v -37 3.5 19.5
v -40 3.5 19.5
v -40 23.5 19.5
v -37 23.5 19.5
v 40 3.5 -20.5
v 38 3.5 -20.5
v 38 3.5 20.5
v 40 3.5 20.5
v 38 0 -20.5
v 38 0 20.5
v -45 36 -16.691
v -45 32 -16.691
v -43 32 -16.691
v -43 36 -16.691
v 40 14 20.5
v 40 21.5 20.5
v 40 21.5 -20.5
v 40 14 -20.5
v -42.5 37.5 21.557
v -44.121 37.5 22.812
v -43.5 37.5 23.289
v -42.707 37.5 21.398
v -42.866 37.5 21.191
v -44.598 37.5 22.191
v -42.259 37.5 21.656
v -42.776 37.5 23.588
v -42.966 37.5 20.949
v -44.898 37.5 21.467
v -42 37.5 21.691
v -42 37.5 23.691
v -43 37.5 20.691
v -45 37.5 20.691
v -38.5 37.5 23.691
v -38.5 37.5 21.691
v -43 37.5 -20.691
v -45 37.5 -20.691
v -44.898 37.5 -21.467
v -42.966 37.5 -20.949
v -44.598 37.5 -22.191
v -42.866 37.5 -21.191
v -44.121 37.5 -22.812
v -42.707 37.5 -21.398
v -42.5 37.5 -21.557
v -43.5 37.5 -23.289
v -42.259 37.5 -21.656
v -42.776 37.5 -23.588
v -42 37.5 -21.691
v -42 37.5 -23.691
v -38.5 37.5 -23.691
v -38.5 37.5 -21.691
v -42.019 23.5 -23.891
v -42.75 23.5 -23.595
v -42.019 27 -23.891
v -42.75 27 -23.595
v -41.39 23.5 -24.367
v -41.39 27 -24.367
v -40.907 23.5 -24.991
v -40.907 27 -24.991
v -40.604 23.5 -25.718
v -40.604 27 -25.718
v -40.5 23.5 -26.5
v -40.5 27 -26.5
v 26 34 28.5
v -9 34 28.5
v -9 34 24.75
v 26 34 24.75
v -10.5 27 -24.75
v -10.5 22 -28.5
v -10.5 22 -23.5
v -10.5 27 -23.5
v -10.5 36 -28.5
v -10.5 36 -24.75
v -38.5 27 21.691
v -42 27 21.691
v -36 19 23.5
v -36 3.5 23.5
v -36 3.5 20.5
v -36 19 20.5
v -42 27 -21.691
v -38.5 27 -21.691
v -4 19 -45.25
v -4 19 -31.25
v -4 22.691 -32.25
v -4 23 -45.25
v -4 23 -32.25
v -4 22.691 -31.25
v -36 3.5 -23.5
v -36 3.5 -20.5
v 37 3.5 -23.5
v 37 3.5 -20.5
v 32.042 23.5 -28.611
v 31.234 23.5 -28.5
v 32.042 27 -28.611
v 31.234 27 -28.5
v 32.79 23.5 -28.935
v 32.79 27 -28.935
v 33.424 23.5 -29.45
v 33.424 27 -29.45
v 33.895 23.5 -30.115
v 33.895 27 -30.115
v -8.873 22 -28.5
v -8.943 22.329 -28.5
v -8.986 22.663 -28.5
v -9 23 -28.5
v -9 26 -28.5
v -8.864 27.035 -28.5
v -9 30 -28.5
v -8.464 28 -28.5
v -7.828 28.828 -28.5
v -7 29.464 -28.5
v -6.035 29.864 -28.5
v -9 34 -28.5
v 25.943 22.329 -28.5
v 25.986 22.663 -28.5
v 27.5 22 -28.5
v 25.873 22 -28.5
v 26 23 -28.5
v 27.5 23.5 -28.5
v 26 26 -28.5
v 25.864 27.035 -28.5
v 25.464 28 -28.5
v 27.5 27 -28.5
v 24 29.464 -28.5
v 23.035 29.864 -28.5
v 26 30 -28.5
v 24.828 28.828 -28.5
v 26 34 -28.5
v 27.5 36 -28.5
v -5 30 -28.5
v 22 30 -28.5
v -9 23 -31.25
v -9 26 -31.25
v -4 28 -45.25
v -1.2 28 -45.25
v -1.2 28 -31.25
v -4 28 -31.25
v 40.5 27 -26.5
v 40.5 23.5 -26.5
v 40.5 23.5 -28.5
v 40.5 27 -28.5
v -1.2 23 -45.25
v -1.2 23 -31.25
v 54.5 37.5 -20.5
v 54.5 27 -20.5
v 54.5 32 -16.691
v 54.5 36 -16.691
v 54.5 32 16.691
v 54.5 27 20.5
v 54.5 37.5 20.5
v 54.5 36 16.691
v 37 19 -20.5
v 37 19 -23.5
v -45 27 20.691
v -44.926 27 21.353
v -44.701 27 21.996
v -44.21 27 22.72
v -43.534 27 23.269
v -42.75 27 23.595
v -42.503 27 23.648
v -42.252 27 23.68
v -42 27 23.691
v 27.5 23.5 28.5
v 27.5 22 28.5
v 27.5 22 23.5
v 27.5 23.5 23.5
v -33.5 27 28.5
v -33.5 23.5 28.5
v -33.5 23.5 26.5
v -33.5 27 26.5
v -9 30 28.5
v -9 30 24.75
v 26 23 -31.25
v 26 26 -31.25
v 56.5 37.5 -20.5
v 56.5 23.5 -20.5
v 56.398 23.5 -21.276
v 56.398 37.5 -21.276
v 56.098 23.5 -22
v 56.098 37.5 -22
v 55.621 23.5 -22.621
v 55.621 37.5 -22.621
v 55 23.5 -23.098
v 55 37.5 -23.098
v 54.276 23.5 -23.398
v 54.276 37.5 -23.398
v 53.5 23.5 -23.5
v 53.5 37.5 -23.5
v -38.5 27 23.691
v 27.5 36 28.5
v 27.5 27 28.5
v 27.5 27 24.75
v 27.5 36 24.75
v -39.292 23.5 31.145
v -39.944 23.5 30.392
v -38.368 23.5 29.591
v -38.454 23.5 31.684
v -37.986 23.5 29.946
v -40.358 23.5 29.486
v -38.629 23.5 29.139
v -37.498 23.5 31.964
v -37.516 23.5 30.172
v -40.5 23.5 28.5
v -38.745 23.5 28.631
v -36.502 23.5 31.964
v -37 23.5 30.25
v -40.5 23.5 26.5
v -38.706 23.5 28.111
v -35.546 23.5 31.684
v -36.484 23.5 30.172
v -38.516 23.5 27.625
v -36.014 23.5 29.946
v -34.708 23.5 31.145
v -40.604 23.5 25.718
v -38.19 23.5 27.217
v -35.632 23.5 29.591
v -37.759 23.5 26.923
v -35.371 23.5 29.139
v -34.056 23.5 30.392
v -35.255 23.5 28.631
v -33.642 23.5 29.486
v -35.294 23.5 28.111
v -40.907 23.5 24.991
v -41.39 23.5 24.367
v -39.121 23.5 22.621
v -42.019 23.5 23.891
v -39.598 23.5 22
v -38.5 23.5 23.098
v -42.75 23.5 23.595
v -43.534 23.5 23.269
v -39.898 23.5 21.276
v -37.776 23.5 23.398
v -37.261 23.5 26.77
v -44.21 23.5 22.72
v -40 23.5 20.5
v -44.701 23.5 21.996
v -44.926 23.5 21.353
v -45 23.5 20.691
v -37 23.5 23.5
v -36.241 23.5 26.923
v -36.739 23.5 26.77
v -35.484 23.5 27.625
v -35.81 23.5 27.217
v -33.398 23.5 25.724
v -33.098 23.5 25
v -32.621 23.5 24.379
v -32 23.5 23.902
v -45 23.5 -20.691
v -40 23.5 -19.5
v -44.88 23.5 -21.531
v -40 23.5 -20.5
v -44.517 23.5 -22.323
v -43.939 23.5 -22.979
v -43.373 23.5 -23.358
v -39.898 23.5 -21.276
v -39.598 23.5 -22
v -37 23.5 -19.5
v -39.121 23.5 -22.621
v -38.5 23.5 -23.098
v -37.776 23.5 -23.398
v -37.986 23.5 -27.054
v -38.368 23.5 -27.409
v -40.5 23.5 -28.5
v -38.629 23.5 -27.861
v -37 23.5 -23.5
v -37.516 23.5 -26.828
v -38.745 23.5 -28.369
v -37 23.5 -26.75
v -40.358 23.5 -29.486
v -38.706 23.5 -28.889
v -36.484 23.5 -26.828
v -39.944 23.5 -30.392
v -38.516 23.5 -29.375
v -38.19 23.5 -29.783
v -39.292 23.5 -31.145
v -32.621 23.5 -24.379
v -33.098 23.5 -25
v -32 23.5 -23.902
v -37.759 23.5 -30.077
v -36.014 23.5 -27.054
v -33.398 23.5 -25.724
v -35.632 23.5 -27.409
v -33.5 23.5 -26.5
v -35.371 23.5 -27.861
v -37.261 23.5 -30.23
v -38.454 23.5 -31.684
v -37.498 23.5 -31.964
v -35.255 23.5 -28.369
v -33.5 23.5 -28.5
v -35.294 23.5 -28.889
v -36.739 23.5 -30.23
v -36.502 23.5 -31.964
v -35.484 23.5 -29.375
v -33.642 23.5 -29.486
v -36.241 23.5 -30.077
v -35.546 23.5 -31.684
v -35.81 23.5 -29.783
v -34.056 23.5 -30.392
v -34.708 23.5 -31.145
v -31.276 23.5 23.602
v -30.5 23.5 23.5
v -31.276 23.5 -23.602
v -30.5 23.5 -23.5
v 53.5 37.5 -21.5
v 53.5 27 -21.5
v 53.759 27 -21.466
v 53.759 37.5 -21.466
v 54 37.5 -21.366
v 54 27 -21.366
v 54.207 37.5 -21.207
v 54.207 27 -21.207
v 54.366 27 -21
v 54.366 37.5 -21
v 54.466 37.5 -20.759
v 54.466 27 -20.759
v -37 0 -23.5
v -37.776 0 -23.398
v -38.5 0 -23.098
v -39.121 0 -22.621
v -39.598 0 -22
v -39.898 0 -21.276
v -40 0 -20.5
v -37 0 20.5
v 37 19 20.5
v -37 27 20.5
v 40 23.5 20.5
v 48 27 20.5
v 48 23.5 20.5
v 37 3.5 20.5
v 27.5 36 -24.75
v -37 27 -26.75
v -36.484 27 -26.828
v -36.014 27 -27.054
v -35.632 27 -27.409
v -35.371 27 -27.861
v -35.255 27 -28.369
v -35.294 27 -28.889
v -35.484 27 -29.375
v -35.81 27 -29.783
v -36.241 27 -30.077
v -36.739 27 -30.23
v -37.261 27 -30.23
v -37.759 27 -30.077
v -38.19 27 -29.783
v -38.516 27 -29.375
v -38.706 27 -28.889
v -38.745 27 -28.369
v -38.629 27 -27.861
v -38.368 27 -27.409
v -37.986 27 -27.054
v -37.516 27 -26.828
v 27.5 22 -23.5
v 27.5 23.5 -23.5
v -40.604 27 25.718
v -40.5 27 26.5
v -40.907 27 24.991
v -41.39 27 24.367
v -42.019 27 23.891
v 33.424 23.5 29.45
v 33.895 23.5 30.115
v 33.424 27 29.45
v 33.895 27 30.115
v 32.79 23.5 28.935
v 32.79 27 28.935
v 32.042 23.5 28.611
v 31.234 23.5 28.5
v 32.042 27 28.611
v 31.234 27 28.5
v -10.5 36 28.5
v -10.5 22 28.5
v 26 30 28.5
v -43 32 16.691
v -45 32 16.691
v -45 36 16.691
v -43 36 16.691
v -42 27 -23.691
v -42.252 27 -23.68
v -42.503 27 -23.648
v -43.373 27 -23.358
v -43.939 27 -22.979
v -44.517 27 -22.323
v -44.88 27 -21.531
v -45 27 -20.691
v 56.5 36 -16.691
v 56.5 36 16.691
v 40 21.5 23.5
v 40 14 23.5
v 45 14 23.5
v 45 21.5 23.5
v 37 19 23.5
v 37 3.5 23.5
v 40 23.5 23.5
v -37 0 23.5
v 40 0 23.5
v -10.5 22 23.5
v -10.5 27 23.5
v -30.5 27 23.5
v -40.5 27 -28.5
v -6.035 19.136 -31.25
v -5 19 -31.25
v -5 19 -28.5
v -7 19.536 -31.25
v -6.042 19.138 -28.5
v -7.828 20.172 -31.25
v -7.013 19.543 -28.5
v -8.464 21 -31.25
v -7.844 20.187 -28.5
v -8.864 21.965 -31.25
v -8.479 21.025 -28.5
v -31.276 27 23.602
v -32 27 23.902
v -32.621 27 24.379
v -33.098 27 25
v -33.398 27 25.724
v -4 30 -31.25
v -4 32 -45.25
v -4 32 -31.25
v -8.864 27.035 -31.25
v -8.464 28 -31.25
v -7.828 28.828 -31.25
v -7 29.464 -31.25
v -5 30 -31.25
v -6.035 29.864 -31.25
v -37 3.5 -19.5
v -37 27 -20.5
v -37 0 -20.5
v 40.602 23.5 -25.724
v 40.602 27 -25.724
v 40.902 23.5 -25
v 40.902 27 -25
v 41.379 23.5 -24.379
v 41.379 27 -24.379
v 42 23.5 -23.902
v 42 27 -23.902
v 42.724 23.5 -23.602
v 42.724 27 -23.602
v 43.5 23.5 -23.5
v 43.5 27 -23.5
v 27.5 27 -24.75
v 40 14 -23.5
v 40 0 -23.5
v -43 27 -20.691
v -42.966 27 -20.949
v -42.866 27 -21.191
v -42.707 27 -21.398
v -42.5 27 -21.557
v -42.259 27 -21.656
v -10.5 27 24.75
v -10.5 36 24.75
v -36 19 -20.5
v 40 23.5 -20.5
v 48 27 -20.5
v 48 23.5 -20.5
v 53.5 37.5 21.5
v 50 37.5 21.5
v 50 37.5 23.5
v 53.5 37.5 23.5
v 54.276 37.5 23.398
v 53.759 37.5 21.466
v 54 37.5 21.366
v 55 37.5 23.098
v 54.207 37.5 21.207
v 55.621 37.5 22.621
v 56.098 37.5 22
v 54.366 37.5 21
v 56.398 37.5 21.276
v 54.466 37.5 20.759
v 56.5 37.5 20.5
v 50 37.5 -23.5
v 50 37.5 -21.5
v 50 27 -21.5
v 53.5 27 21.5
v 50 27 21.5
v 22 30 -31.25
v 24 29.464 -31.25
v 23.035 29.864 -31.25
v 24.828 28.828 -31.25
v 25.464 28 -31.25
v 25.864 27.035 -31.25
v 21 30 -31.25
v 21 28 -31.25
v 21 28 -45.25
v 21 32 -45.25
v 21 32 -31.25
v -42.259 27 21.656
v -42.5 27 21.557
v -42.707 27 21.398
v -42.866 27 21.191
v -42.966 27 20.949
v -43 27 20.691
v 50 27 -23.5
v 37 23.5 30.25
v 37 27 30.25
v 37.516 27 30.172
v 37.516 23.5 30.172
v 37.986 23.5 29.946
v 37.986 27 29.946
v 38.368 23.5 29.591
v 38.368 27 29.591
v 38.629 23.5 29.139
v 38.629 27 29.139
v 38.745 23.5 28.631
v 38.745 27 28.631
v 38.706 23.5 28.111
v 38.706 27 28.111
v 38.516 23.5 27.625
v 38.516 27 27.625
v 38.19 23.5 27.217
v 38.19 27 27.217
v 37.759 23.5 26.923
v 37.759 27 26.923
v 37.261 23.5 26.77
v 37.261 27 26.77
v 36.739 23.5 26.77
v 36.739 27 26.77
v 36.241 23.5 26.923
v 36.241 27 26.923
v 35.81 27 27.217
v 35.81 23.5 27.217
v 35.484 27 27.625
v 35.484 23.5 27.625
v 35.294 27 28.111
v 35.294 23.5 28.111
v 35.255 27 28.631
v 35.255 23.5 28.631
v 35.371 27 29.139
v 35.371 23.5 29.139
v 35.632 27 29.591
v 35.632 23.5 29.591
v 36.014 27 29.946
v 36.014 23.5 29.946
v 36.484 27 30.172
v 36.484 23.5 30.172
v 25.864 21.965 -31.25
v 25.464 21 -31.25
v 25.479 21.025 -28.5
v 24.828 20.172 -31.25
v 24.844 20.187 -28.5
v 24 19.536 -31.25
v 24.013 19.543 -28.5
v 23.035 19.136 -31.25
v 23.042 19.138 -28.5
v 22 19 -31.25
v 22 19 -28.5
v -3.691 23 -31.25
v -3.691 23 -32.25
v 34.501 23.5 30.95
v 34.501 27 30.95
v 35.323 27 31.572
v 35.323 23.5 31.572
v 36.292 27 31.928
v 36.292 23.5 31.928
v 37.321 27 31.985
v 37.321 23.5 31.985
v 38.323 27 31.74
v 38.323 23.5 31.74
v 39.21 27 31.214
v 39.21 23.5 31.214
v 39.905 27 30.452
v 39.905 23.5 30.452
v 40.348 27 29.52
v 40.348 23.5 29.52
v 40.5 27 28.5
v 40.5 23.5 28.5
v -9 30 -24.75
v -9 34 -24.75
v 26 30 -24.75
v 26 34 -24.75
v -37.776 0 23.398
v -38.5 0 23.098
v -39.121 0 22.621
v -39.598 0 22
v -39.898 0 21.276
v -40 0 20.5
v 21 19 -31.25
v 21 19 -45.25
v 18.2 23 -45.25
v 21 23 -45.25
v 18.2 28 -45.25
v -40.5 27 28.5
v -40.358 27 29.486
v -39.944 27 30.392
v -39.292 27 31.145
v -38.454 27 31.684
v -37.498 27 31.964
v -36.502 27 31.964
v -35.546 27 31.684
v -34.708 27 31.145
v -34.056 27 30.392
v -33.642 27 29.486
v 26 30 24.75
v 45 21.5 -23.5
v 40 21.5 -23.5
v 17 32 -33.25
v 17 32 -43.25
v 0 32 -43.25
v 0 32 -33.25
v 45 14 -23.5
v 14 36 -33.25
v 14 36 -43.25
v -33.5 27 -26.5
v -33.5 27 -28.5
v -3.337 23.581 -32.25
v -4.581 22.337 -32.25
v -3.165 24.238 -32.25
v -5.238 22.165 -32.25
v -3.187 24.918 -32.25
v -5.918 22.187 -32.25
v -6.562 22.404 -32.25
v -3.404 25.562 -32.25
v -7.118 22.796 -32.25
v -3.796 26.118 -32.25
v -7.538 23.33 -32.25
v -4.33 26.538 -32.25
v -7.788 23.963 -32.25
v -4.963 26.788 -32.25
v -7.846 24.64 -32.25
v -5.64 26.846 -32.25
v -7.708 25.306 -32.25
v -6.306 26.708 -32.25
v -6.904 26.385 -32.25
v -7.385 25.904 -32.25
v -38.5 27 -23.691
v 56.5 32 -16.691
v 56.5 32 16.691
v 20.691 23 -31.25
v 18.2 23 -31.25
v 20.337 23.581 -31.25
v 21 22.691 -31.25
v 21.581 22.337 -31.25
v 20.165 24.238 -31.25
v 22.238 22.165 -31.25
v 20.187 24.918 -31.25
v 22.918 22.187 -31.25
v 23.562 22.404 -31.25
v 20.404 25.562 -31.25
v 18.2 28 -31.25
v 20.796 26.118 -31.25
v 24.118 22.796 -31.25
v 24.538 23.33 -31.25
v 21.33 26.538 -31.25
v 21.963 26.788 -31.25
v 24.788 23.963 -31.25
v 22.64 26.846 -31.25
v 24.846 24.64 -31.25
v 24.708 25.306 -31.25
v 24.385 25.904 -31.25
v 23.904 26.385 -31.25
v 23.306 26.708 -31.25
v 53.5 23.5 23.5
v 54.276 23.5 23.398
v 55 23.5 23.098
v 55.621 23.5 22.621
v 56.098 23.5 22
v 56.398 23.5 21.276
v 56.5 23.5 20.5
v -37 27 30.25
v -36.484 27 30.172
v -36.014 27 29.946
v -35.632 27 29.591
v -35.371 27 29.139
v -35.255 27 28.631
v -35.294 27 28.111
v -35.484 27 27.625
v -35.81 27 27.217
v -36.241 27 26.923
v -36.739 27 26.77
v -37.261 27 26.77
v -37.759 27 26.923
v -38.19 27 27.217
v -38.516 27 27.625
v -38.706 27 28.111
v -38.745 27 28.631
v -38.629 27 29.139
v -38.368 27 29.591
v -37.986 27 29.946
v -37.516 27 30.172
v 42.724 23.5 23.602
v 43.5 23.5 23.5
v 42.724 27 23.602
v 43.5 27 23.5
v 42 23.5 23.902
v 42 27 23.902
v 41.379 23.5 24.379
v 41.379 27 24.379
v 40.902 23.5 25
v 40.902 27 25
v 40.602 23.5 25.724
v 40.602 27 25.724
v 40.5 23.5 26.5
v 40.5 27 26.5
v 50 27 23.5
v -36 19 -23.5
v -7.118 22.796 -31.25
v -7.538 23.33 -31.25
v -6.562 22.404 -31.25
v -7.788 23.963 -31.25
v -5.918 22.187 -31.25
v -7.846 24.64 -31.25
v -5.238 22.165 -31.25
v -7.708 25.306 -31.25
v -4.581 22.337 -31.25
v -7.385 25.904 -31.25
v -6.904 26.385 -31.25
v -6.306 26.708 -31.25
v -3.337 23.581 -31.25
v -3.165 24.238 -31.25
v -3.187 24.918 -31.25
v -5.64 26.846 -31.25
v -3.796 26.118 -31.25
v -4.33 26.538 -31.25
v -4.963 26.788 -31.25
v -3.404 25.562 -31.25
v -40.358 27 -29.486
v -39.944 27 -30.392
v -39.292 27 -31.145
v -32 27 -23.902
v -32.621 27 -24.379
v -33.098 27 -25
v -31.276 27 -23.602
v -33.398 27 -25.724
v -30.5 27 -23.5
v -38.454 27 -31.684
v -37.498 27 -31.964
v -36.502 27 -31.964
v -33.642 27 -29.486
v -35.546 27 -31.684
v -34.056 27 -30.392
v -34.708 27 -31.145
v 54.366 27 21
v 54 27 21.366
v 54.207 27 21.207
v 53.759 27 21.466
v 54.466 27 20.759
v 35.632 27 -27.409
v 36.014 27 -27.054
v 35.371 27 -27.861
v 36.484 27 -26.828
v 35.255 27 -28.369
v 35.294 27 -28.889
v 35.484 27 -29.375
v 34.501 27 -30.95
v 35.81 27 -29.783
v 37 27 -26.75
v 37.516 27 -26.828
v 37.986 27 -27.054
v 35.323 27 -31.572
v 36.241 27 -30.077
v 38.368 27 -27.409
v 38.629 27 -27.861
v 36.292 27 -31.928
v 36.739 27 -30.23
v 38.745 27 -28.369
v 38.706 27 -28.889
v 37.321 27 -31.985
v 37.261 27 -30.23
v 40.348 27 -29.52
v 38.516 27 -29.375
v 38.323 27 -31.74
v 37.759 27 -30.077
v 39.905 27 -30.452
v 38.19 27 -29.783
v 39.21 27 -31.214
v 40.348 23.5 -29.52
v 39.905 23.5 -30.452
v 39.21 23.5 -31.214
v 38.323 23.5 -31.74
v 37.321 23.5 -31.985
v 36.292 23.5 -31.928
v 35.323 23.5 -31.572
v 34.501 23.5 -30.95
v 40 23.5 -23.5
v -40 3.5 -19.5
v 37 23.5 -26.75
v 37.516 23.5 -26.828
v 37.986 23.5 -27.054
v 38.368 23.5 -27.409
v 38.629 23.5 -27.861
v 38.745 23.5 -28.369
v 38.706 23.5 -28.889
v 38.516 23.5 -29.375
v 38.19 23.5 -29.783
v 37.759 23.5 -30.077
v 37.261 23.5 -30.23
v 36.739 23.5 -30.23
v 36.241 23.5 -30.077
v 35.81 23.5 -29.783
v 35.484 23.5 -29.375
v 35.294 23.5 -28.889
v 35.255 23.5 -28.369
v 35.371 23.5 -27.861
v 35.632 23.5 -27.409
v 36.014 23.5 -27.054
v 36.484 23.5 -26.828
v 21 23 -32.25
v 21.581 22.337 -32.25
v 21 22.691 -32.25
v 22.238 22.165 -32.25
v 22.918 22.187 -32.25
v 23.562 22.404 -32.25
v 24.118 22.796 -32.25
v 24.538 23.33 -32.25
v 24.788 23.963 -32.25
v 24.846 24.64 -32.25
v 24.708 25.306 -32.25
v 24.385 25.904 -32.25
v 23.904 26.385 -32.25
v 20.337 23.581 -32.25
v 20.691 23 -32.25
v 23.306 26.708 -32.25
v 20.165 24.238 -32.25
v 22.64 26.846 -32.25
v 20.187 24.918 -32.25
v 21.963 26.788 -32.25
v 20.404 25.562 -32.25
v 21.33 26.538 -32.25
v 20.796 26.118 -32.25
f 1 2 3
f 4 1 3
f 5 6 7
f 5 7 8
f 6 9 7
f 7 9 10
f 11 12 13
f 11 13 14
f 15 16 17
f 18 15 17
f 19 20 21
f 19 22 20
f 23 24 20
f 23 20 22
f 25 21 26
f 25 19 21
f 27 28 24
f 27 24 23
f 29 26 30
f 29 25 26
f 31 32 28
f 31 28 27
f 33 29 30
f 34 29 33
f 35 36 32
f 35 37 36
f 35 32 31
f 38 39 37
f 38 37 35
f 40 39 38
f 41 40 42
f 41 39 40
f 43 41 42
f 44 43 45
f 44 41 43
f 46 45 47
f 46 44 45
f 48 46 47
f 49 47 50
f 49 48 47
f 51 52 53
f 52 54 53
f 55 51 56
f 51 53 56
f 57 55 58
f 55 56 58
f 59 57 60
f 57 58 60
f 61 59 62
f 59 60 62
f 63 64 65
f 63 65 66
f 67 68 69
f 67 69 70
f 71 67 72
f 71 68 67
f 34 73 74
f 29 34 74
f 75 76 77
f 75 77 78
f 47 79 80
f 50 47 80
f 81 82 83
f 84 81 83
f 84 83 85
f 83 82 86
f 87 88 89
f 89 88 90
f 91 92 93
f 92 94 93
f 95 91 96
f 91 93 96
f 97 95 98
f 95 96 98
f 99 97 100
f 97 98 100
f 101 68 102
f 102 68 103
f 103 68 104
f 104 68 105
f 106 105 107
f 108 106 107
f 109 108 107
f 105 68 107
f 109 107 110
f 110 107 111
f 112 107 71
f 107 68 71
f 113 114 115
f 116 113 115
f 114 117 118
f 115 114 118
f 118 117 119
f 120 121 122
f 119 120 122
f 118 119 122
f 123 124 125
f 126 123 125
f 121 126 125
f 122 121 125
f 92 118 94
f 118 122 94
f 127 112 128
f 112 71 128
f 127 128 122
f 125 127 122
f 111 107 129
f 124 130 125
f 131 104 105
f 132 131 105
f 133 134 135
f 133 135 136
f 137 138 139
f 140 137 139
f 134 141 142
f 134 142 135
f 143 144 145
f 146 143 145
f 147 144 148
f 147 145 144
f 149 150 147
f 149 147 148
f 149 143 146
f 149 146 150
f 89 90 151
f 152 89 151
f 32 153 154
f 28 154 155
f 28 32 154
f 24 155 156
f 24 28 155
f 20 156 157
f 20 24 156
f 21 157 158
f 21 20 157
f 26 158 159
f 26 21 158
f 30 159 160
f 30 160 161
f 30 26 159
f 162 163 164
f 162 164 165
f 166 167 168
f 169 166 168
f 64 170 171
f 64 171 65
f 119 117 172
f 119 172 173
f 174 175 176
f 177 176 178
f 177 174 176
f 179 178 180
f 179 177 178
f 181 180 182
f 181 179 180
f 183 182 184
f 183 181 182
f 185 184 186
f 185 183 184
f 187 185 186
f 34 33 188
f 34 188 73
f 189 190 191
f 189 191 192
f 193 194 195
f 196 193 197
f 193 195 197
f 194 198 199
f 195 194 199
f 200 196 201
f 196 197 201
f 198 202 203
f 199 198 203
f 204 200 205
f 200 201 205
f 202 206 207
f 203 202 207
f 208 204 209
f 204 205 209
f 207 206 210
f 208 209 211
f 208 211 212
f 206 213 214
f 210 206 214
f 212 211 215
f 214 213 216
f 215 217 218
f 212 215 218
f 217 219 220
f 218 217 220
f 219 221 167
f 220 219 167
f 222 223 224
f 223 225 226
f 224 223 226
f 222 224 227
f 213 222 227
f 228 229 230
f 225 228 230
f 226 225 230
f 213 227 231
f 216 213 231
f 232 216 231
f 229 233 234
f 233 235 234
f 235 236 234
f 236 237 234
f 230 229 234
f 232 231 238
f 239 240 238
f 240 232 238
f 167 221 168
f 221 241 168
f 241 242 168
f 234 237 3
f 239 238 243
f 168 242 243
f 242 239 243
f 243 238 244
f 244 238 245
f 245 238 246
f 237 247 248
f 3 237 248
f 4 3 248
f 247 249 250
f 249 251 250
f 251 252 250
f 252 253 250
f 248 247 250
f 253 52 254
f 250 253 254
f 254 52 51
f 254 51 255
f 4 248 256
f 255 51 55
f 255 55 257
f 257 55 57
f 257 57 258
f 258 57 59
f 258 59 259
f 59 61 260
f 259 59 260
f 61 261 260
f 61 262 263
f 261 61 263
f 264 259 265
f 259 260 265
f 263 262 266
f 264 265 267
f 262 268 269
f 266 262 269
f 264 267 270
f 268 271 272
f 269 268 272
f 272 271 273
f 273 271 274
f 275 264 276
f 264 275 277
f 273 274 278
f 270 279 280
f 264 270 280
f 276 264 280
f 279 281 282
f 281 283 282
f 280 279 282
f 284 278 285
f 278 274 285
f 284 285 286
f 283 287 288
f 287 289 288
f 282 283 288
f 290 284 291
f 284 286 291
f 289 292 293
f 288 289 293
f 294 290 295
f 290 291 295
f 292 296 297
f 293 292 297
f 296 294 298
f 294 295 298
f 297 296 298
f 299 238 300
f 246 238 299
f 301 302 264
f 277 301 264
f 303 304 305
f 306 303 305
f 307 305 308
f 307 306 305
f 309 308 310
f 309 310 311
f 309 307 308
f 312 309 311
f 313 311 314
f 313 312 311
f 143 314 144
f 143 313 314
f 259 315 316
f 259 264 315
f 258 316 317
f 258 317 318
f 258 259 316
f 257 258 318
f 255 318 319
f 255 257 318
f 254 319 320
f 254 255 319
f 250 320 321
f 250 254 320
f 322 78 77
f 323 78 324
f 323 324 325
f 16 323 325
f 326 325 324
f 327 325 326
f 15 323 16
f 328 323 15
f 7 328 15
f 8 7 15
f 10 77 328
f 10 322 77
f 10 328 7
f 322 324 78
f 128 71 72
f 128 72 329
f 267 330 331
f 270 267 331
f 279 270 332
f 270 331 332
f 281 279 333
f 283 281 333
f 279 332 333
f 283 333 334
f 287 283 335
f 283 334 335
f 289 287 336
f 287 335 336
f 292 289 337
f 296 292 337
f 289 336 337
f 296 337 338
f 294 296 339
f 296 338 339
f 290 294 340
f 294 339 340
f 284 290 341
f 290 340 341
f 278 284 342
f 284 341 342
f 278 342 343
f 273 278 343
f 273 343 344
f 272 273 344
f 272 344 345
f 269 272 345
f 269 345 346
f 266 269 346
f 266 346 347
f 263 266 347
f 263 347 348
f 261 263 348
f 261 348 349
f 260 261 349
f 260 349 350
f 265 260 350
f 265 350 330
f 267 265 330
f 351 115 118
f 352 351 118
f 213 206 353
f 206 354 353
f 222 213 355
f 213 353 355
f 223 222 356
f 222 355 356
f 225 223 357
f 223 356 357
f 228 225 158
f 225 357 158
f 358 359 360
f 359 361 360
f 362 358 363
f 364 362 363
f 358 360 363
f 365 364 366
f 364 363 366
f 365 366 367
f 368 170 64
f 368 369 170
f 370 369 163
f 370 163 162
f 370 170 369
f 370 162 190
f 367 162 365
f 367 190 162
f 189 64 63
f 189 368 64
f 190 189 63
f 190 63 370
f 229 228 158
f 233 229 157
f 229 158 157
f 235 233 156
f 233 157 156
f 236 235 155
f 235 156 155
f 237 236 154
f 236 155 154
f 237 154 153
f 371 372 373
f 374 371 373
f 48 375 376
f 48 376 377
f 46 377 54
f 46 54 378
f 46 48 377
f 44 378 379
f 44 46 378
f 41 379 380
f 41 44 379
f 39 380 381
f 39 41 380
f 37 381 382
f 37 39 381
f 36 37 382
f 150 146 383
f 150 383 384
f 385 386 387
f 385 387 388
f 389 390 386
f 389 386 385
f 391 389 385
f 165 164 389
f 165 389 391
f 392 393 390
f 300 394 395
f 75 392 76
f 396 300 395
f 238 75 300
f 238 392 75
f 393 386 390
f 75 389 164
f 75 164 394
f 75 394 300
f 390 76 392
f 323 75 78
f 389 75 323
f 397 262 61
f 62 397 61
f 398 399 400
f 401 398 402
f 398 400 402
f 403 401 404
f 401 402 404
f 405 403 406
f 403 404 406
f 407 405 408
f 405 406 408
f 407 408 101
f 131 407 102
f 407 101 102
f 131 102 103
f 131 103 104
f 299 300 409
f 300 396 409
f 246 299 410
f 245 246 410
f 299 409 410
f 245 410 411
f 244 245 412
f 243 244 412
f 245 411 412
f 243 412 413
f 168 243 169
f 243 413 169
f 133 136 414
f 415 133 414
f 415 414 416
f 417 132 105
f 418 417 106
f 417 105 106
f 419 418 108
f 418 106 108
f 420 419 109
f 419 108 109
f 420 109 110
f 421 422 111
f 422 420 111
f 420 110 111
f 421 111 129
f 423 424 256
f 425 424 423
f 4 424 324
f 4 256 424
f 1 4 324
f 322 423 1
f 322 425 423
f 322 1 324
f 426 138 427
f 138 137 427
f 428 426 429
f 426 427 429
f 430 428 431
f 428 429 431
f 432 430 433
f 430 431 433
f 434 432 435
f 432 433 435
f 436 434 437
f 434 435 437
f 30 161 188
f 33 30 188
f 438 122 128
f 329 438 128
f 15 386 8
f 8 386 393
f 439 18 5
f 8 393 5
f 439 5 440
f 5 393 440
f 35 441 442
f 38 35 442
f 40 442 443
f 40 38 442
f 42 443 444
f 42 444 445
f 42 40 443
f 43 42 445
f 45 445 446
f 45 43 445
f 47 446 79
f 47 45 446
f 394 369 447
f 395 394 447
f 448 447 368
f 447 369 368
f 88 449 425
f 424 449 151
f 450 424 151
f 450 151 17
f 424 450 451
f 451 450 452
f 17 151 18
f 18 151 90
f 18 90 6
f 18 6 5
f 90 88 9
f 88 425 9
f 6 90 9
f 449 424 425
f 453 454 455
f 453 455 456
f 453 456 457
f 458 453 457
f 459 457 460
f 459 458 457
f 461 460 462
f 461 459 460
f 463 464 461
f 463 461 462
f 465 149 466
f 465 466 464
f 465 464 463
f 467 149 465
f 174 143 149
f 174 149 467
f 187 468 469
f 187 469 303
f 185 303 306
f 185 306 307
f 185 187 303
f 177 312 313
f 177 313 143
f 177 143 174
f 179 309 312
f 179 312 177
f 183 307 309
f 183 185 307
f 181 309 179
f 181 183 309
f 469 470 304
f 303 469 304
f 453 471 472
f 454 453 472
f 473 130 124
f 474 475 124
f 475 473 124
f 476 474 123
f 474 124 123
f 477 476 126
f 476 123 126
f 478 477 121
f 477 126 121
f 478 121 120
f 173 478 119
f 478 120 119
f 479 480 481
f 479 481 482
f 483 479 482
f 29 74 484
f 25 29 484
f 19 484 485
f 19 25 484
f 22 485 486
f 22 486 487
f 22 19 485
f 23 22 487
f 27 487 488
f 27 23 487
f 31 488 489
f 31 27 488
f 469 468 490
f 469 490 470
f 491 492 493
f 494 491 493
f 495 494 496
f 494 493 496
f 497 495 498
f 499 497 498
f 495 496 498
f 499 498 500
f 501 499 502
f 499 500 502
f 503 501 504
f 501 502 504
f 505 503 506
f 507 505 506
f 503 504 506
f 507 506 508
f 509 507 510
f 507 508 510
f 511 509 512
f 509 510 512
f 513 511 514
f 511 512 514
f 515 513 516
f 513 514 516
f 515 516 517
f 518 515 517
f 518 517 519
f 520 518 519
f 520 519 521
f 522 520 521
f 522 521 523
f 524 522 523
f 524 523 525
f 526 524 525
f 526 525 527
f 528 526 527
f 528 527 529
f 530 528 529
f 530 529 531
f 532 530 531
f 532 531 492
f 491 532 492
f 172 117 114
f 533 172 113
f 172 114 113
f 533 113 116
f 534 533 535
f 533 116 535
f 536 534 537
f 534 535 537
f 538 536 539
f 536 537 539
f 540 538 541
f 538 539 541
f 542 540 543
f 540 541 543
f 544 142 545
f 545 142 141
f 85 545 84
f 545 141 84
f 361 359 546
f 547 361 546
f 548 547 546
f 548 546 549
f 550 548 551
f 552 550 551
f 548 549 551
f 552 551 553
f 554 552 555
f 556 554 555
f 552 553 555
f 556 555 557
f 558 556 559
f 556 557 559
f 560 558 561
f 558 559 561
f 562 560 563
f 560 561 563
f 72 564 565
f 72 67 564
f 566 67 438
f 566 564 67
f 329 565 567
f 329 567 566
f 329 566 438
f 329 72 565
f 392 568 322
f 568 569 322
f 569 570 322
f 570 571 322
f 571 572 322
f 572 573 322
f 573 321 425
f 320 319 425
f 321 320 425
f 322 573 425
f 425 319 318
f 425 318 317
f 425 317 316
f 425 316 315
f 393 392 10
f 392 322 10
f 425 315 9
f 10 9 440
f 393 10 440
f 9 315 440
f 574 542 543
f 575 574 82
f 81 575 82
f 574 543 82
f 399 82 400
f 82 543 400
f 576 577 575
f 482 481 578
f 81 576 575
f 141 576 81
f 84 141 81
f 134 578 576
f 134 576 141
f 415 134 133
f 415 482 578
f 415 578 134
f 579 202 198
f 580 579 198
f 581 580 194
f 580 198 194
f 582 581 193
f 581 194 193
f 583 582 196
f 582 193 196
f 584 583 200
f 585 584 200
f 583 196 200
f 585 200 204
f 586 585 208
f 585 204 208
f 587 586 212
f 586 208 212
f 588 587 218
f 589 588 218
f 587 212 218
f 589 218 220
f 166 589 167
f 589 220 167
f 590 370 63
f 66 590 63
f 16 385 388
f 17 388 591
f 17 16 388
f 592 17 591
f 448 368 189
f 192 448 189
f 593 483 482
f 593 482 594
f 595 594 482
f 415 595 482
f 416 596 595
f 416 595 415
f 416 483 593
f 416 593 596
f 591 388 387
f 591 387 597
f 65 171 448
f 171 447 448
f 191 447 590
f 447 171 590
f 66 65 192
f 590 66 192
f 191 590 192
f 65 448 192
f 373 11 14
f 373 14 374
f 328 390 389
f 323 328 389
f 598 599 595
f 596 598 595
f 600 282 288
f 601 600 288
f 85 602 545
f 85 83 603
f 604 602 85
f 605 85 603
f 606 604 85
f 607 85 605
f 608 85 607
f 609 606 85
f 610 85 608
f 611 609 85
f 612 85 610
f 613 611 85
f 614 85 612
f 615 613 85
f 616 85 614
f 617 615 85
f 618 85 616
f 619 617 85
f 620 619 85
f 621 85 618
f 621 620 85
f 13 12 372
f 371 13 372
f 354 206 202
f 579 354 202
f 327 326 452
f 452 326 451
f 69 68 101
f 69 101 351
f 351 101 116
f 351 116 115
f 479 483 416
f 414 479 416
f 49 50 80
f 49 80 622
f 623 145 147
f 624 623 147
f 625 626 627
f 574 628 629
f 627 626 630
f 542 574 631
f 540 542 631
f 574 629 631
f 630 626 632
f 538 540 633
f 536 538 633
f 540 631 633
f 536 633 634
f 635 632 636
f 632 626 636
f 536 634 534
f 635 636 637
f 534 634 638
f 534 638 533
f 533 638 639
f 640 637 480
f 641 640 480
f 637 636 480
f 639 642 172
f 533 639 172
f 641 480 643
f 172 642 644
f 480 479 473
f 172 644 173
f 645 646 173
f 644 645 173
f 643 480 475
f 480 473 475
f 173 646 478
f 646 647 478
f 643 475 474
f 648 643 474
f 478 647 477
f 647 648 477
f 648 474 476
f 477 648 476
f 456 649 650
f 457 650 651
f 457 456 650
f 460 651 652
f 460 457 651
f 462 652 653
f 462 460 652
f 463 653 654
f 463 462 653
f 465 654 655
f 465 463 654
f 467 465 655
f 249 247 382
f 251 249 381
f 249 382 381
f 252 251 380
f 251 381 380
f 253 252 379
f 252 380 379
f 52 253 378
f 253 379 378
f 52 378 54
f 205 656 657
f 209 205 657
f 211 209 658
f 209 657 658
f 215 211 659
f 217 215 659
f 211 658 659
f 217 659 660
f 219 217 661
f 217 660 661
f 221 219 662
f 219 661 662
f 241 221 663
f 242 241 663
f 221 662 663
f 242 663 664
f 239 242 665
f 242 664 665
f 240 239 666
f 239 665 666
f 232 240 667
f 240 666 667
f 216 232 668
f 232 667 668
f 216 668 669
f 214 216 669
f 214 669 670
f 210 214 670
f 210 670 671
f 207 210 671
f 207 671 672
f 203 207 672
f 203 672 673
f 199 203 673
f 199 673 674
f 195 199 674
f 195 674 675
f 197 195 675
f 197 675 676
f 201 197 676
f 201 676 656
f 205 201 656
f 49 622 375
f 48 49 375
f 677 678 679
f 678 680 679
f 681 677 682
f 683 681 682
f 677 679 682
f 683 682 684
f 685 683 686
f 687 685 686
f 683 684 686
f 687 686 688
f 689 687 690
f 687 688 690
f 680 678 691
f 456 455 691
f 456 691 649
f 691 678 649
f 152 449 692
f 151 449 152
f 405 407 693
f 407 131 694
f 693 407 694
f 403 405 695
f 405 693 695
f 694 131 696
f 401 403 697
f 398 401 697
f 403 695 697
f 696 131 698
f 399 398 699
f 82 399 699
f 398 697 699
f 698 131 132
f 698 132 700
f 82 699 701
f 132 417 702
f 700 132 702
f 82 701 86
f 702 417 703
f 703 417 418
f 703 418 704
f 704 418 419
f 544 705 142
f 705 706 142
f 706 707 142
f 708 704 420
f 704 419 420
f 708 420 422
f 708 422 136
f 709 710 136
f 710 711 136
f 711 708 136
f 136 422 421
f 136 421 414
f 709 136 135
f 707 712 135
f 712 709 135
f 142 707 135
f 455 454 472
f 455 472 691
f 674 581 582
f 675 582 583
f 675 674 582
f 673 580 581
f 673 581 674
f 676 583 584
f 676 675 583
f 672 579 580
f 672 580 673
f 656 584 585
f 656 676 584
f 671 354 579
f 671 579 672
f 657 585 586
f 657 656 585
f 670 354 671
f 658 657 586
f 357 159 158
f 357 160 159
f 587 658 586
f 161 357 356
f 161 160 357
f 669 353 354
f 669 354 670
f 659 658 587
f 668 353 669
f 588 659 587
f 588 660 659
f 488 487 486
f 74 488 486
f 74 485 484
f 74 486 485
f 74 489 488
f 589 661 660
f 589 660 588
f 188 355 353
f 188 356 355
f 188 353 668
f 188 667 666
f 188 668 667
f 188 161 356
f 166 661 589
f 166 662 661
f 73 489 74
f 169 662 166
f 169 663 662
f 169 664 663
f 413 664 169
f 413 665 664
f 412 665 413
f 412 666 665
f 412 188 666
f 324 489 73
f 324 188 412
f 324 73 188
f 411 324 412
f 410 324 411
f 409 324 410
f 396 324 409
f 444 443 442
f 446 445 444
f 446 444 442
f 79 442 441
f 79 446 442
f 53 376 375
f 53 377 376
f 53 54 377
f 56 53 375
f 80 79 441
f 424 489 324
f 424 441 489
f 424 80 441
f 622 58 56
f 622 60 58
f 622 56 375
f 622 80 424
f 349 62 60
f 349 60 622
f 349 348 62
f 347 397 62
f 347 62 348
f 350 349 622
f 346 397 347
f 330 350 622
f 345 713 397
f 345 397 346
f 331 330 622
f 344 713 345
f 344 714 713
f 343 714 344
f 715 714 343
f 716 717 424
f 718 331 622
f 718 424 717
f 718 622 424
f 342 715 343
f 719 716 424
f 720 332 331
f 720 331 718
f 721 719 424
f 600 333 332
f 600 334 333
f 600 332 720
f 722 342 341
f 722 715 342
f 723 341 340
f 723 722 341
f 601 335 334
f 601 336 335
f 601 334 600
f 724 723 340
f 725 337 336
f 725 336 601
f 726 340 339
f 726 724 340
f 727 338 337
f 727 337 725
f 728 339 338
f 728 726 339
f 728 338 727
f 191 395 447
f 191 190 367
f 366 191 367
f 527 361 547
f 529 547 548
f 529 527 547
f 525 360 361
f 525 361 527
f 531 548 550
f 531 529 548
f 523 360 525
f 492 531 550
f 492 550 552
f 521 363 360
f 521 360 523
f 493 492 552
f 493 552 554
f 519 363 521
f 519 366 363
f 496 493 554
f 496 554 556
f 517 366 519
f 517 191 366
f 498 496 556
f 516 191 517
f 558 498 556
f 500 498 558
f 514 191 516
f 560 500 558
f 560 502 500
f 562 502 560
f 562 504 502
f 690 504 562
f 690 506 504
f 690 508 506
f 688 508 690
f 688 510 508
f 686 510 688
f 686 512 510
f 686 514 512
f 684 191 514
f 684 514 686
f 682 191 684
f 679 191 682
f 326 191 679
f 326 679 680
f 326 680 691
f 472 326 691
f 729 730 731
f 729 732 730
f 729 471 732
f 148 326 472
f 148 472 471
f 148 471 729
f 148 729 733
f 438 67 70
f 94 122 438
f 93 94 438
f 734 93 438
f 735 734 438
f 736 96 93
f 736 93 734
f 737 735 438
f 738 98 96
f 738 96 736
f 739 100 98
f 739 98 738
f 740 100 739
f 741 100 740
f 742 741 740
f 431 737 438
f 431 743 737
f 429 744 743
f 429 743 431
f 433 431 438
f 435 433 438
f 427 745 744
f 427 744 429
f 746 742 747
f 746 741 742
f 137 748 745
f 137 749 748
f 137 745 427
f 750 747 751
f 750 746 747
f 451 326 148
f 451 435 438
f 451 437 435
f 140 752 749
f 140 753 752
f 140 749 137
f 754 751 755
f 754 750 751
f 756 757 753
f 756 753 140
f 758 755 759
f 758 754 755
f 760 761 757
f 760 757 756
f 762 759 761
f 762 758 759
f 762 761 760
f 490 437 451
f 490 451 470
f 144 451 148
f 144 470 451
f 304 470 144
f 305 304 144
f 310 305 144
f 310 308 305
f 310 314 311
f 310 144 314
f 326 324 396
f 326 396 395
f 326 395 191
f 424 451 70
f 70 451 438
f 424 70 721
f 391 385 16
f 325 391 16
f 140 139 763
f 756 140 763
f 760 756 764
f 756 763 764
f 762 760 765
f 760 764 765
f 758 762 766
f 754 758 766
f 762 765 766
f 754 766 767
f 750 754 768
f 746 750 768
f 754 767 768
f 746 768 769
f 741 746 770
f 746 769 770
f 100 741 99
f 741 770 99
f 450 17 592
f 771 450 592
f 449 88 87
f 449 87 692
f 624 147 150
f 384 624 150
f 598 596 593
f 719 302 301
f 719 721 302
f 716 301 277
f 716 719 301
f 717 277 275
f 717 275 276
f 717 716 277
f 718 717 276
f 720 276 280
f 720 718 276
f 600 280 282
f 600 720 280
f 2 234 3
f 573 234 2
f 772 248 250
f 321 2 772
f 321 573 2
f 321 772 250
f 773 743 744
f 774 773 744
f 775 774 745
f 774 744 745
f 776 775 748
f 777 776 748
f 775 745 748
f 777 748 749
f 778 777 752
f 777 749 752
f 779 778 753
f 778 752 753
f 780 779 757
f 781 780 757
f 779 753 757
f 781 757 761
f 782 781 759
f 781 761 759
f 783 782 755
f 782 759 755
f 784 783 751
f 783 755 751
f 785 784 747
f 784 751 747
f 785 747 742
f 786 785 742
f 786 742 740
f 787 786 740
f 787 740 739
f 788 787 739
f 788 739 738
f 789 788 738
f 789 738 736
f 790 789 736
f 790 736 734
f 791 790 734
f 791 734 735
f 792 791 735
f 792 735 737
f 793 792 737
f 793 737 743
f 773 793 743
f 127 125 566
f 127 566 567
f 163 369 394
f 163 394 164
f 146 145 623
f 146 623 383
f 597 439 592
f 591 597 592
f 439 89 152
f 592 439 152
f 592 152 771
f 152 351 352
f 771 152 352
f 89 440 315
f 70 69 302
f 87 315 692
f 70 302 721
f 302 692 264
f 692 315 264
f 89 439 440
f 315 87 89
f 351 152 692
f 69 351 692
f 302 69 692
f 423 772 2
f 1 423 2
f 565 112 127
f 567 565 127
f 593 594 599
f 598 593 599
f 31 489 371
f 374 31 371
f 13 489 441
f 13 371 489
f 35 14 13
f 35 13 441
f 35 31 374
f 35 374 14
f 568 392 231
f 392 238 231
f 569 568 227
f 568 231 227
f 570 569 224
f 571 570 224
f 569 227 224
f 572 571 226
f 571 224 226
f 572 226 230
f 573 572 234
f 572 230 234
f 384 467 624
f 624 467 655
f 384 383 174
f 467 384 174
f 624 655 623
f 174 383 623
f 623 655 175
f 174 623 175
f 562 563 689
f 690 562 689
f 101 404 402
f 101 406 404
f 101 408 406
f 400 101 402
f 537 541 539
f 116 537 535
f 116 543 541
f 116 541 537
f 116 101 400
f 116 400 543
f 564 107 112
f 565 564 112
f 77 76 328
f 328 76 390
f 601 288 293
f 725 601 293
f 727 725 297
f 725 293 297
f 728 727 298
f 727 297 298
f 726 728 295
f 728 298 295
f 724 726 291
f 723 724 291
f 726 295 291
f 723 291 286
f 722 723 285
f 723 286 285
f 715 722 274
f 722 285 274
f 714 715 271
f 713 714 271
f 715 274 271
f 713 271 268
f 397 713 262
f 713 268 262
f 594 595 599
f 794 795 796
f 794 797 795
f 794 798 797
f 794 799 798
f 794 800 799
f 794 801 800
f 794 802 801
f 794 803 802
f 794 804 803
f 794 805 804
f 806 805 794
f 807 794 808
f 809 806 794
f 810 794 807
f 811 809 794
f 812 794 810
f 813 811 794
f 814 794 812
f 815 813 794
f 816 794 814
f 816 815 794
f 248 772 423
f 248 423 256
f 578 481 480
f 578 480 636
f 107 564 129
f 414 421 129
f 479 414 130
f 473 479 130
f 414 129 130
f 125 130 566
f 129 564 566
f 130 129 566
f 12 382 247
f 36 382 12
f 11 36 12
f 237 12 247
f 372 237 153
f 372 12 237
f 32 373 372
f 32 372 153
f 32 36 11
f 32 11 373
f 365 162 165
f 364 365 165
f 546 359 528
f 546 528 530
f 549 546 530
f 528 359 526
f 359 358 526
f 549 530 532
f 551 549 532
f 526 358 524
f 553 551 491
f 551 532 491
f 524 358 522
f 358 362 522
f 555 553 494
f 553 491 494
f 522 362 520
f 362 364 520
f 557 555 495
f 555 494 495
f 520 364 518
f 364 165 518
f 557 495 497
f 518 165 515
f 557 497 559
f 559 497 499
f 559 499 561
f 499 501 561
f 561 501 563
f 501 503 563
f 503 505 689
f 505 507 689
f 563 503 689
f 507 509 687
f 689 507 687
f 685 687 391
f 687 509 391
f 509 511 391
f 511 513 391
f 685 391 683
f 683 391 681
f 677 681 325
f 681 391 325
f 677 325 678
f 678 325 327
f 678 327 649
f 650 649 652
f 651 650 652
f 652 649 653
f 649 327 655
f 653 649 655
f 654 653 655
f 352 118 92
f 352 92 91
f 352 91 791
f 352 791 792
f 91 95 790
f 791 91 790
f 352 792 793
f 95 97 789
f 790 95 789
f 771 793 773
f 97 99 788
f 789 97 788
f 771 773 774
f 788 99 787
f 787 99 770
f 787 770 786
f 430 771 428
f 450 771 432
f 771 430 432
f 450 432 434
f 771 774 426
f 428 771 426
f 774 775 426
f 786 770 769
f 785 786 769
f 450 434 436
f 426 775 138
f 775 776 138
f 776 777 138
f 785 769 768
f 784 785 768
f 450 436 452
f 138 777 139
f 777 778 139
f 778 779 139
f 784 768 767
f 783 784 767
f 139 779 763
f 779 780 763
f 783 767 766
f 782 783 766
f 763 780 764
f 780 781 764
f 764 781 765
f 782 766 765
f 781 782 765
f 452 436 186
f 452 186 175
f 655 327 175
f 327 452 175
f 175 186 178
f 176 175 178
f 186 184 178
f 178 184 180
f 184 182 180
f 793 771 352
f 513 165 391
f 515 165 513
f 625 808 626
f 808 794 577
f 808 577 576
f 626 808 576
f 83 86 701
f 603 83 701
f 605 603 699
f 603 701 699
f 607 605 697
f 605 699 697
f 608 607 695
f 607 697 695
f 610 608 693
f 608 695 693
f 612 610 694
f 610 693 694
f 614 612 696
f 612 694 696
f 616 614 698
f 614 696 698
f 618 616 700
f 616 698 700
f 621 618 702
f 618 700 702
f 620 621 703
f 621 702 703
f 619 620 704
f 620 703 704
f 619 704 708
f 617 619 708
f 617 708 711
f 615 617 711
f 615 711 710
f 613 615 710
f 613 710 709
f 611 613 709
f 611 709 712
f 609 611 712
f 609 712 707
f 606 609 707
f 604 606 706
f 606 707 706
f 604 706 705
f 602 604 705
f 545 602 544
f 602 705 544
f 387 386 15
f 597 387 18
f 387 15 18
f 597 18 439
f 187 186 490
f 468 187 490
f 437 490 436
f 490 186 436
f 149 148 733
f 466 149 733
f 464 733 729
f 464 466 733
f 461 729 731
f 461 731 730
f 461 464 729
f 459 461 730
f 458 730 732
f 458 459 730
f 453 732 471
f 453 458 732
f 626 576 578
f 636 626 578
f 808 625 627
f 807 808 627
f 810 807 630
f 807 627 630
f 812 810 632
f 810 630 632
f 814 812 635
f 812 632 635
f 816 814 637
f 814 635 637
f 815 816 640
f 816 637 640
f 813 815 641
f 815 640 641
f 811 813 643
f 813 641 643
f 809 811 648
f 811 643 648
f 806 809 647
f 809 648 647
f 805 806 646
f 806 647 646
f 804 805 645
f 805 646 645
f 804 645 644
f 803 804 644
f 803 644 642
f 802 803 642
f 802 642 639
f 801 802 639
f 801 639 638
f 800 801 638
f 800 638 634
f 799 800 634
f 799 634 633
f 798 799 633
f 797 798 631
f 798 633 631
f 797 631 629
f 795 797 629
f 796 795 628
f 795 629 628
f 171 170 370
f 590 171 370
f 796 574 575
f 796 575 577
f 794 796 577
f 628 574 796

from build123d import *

# Parameters (mm, degrees)
SKETCH_1_W          = 80
SKETCH_1_H          = 47
EXTRUDE_1_DEPTH     = 23.5
EXTRUDE_2_DEPTH     = 3.5
SKETCH_19_R         = 1.75
CUT_EXTRUDE_7_DEPTH = 71.322471515
FILLET_2_R          = 3
SKETCH_3_W          = 85
SKETCH_3_H          = 41
CUT_EXTRUDE_1_DEPTH = 23.5
SKETCH_4_W          = 75
SKETCH_4_H          = 41
CUT_EXTRUDE_2_DEPTH = 4
SKETCH_5_W          = 73
SKETCH_5_H          = 15.5
CUT_EXTRUDE_3_DEPTH = 84.674966388
SKETCH_6_W          = 39
SKETCH_6_H          = 20
CUT_EXTRUDE_4_DEPTH = 4
EXTRUDE_3_REACH     = 89.072
SKETCH_9_W          = 38
SKETCH_9_H          = 5
SKETCH_10_W         = 38
SKETCH_10_H         = 9
EXTRUDE_4_DEPTH     = 3.75
SKETCH_11_W         = 35
SKETCH_11_H         = 4
CUT_EXTRUDE_5_DEPTH = 3.75
FILLET_3_R          = 3
FILLET_4_R          = 3
EXTRUDE_START       = 10.5
EXTRUDE_5_DEPTH     = 10.5
SKETCH_13_W         = 33.381049962
SKETCH_13_H         = 4
CUT_EXTRUDE_6_DEPTH = 113.838380057
SKETCH_14_W         = 47
SKETCH_14_H         = 7.5
EXTRUDE_6_DEPTH     = 5
SKETCH_15_W         = 35
SKETCH_15_H         = 11
EXTRUDE_7_DEPTH     = 2.75
SKETCH_16_W         = 25
SKETCH_16_H         = 13
EXTRUDE_8_DEPTH     = 14
SKETCH_21_W         = 2.8
SKETCH_21_H         = 5
CUT_EXTRUDE_8_DEPTH = 14
SKETCH_20_R         = 2.35
EXTRUDE_10_DEPTH    = 1
FILLET_5_R          = 4
EXTRUDE_START_2     = -2
EXTRUDE_9_DEPTH     = 10


with BuildPart() as part:
    # 草图1 → 凸台-拉伸1 (new body)
    with BuildSketch(Plane(origin=(0, 0, 0), x_dir=(1, 0, 0), z_dir=(0, 1, 0))):
        Rectangle(SKETCH_1_W, SKETCH_1_H)
    extrude(amount=EXTRUDE_1_DEPTH)

    # 草图2 → 凸台-拉伸2 (add)
    with BuildSketch(Plane(origin=(0, 23.5, 0), x_dir=(1, 0, 0), z_dir=(0, 1, 0))):
        with BuildLine():
            Line((-10.5, -28.5), (33.5, -28.5))
            ThreePointArc((33.5, -28.5), (37, -32), (40.5, -28.5))
            Line((40.5, -28.5), (40.5, -23.5))
            Line((40.5, -23.5), (56.5, -23.5))
            Line((56.5, -23.5), (56.5, 23.5))
            Line((56.5, 23.5), (40.5, 23.5))
            Line((40.5, 23.5), (40.5, 28.5))
            ThreePointArc((40.5, 28.5), (37, 32), (33.5, 28.5))
            Line((33.5, 28.5), (-10.5, 28.5))
            Line((-10.5, 28.5), (-10.5, 23.5))
            Line((-10.5, 23.5), (-33.5, 23.5))
            Line((-33.5, 23.5), (-33.5, 28.5))
            ThreePointArc((-33.5, 28.5), (-37, 32), (-40.5, 28.5))
            Line((-40.5, 28.5), (-40.5, 23.5))
            Line((-40.5, 23.5), (-45, 23.5))
            Line((-45, 23.5), (-45, -23.5))
            Line((-45, -23.5), (-40.5, -23.5))
            Line((-40.5, -23.5), (-40.5, -28.5))
            ThreePointArc((-40.5, -28.5), (-37, -32), (-33.5, -28.5))
            Line((-33.5, -28.5), (-33.5, -23.5))
            Line((-33.5, -23.5), (-10.5, -23.5))
            Line((-10.5, -23.5), (-10.5, -28.5))
        make_face()
    extrude(amount=EXTRUDE_2_DEPTH)

    # 草图19 → 切除-拉伸7 (cut, through all)
    with BuildSketch(Plane(origin=(0, 27, 0), x_dir=(1, 0, 0), z_dir=(0, 1, 0))):
        with Locations(Location((-37, 28.5, 0), (0, 0, 270))):
            Circle(SKETCH_19_R)
        with Locations(Location((37, 28.5, 0), (0, 0, 270))):
            Circle(SKETCH_19_R)
        with Locations(Location((37, -28.5, 0), (0, 0, 270))):
            Circle(SKETCH_19_R)
        with Locations(Location((-37, -28.5, 0), (0, 0, 270))):
            Circle(SKETCH_19_R)
    extrude(amount=-CUT_EXTRUDE_7_DEPTH, mode=Mode.SUBTRACT)

    # 圆角2
    fillet_2_edges = [part.edges().sort_by_distance(p)[0] for p in [
        (-40, 11.75, -23.5),
        (-40, 11.75, 23.5),
    ]]
    fillet(fillet_2_edges, radius=FILLET_2_R)

    # 草图3 → 切除-拉伸1 (cut)
    with BuildSketch(Plane(origin=(0, 27, 0), x_dir=(1, 0, 0), z_dir=(0, 1, 0))):
        with Locations((5.5, 0)):
            Rectangle(SKETCH_3_W, SKETCH_3_H)
    extrude(amount=-CUT_EXTRUDE_1_DEPTH, mode=Mode.SUBTRACT)

    # 草图4 → 切除-拉伸2 (cut)
    with BuildSketch(Plane.XZ):
        with Locations((0.5, 0)):
            Rectangle(SKETCH_4_W, SKETCH_4_H)
    extrude(amount=-CUT_EXTRUDE_2_DEPTH, mode=Mode.SUBTRACT)

    # 草图5 → 切除-拉伸3 (cut, through all)
    with BuildSketch(Plane.XY.offset(23.5)):
        with Locations((0.5, 11.25)):
            Rectangle(SKETCH_5_W, SKETCH_5_H)
    extrude(amount=-CUT_EXTRUDE_3_DEPTH, mode=Mode.SUBTRACT)

    # 草图6 → 切除-拉伸4 (cut)
    with BuildSketch(Plane.ZY.offset(40)):
        with Locations((0, 13.5)):
            Rectangle(SKETCH_6_W, SKETCH_6_H)
    extrude(amount=-CUT_EXTRUDE_4_DEPTH, mode=Mode.SUBTRACT)

    # 草图9 → 凸台-拉伸3 (add, up to next)
    with BuildSketch(Plane.XY.offset(28.5), mode=Mode.PRIVATE) as extrude_3_sk1:
        with Locations((8.5, 24.5)):
            Rectangle(SKETCH_9_W, SKETCH_9_H)
    extrude_3_tool1 = extrude(extrude_3_sk1.sketch, amount=-EXTRUDE_3_REACH, mode=Mode.PRIVATE) - part.part
    extrude_3 = extrude_3_tool1.solids().sort_by_distance((8.5, 24.5, 28.5))[0]
    add(extrude_3)

    # 草图10 → 凸台-拉伸4 (add)
    with BuildSketch(Plane.XY.offset(28.5)):
        with Locations((8.5, 31.5)):
            Rectangle(SKETCH_10_W, SKETCH_10_H)
    extrude_4 = extrude(amount=-EXTRUDE_4_DEPTH)

    # 草图11 → 切除-拉伸5 (cut)
    with BuildSketch(Plane.XY.offset(28.5)):
        with Locations((8.5, 32)):
            Rectangle(SKETCH_11_W, SKETCH_11_H)
    cut_extrude_5 = extrude(amount=-CUT_EXTRUDE_5_DEPTH, mode=Mode.SUBTRACT)

    # 镜向1: 凸台-拉伸3, 凸台-拉伸4, 切除-拉伸5 across plane
    add(extrude_3.mirror(Plane.XY))
    add(extrude_4.mirror(Plane.XY))
    add(cut_extrude_5.mirror(Plane.XY), mode=Mode.SUBTRACT)

    # 圆角3
    fillet_3_edges = [part.edges().sort_by_distance(p)[0] for p in [
        (33.5, 25.25, 28.5),
        (-40.5, 25.25, 23.5),
        (40.5, 25.25, -23.5),
        (33.5, 25.25, -28.5),
        (-33.5, 25.25, -23.5),
        (-33.5, 25.25, 23.5),
        (40.5, 25.25, 23.5),
        (-40.5, 25.25, -23.5),
    ]]
    fillet(fillet_3_edges, radius=FILLET_3_R)

    # 圆角4
    fillet_4_edges = [part.edges().sort_by_distance(p)[0] for p in [
        (56.5, 25.25, 23.5),
        (56.5, 25.25, -23.5),
        (-45, 25.25, -23.5),
        (-45, 25.25, 23.5),
    ]]
    fillet(fillet_4_edges, radius=FILLET_4_R)

    # 草图12 → 凸台-拉伸5 (add)
    with BuildSketch(Plane(origin=(0, 27, 0), x_dir=(1, 0, 0), z_dir=(0, 1, 0)).offset(EXTRUDE_START)):
        with BuildLine():
            Line((-45, 20.690524981), (-45, -20.690524981))
            ThreePointArc((-45, -20.690524981), (-44.121320344, -22.811845324), (-42, -23.690524981))
            Line((-42, -23.690524981), (-38.5, -23.690524981))
            Line((-38.5, -23.690524981), (-38.5, -21.690524981))
            Line((-38.5, -21.690524981), (-42, -21.690524981))
            ThreePointArc((-42, -21.690524981), (-42.707106781, -21.397631762), (-43, -20.690524981))
            Line((-43, -20.690524981), (-43, 20.690524981))
            ThreePointArc((-43, 20.690524981), (-42.707106781, 21.397631762), (-42, 21.690524981))
            Line((-42, 21.690524981), (-38.5, 21.690524981))
            Line((-38.5, 21.690524981), (-38.5, 23.690524981))
            Line((-38.5, 23.690524981), (-42, 23.690524981))
            ThreePointArc((-42, 23.690524981), (-44.121320344, 22.811845324), (-45, 20.690524981))
        make_face()
        with BuildLine():
            Line((53.5, 23.5), (50, 23.5))
            Line((50, 23.5), (50, 21.5))
            Line((50, 21.5), (53.5, 21.5))
            ThreePointArc((53.5, 21.5), (54.207106781, 21.207106781), (54.5, 20.5))
            Line((54.5, 20.5), (54.5, -20.5))
            ThreePointArc((54.5, -20.5), (54.207106781, -21.207106781), (53.5, -21.5))
            Line((53.5, -21.5), (50, -21.5))
            Line((50, -21.5), (50, -23.5))
            Line((50, -23.5), (53.5, -23.5))
            ThreePointArc((53.5, -23.5), (55.621320344, -22.621320344), (56.5, -20.5))
            Line((56.5, -20.5), (56.5, 20.5))
            ThreePointArc((56.5, 20.5), (55.621320344, 22.621320344), (53.5, 23.5))
        make_face()
    extrude(amount=-EXTRUDE_5_DEPTH)

    # 草图13 → 切除-拉伸6 (cut, through all)
    with BuildSketch(Plane.ZY.offset(45)):
        with Locations((0, 34)):
            Rectangle(SKETCH_13_W, SKETCH_13_H)
    extrude(amount=-CUT_EXTRUDE_6_DEPTH, mode=Mode.SUBTRACT)

    # 草图14 → 凸台-拉伸6 (add)
    with BuildSketch(Plane(origin=(40, 0, 0), x_dir=(0, 0, -1), z_dir=(1, 0, 0))):
        with Locations((0, 17.75)):
            Rectangle(SKETCH_14_W, SKETCH_14_H)
    extrude(amount=EXTRUDE_6_DEPTH)

    # 草图15 → 凸台-拉伸7 (add)
    with BuildSketch(Plane.XY.offset(-28.5)):
        with Locations((8.5, 24.5)):
            Rectangle(SKETCH_15_W, SKETCH_15_H)
    extrude(amount=-EXTRUDE_7_DEPTH)

    # 草图16 → 凸台-拉伸8 (add)
    with BuildSketch(Plane(origin=(0, 0, -31.25), x_dir=(-1, 0, 0), z_dir=(0, 0, -1))):
        with Locations((-8.5, 25.5)):
            Rectangle(SKETCH_16_W, SKETCH_16_H)
    extrude(amount=EXTRUDE_8_DEPTH)

    # 草图21 → 切除-拉伸8 (cut)
    with BuildSketch(Plane(origin=(0, 0, -45.25), x_dir=(-1, 0, 0), z_dir=(0, 0, -1))):
        with Locations((-19.6, 25.5)):
            Rectangle(SKETCH_21_W, SKETCH_21_H)
        with Locations((2.6, 25.5)):
            Rectangle(SKETCH_21_W, SKETCH_21_H)
    extrude(amount=-CUT_EXTRUDE_8_DEPTH, mode=Mode.SUBTRACT)

    # 草图20 → 凸台-拉伸10 (add)
    with BuildSketch(Plane(origin=(0, 0, -31.25), x_dir=(-1, 0, 0), z_dir=(0, 0, -1))):
        with Locations((-22.5, 24.5)):
            Circle(SKETCH_20_R)
        with Locations((5.5, 24.5)):
            Circle(SKETCH_20_R)
    extrude(amount=EXTRUDE_10_DEPTH)

    # 圆角5
    # the kernel refuses this fillet: 4 mm, written as the material it takes off along each edge
    with BuildSketch(Plane(origin=(26, 19, -28.5), x_dir=(-1, 0, 0), z_dir=(0, 0, -1)), Plane(origin=(-9, 30, -28.5), x_dir=(1, 0, 0), z_dir=(0, 0, -1))) as fillet_5_piece_1:
        with BuildLine():
            CenterArc((FILLET_5_R, FILLET_5_R), FILLET_5_R, 180, 90)
            Line((0, FILLET_5_R), (0, 0))
            Line((0, 0), (FILLET_5_R, 0))
        make_face()
    extrude(amount=12.75, mode=Mode.SUBTRACT)
    with BuildSketch(Plane(origin=(26, 30, -28.5), x_dir=(-1, 0, 0), z_dir=(0, 0, -1)), Plane(origin=(-9, 19, -28.5), x_dir=(1, 0, 0), z_dir=(0, 0, -1))) as fillet_5_piece_2:
        with BuildLine():
            CenterArc((FILLET_5_R, -FILLET_5_R), FILLET_5_R, 90, 90)
            Line((0, -FILLET_5_R), (0, 0))
            Line((0, 0), (FILLET_5_R, 0))
        make_face()
    extrude(amount=12.75, mode=Mode.SUBTRACT)

    # 草图17 → 凸台-拉伸9 (add)
    with BuildSketch(Plane(origin=(0, 0, -45.25), x_dir=(-1, 0, 0), z_dir=(0, 0, -1)).offset(EXTRUDE_START_2)):
        Polygon((-17, 32), (-14, 36), (0, 32), align=None)
    extrude(amount=-EXTRUDE_9_DEPTH)


solid = part.part
